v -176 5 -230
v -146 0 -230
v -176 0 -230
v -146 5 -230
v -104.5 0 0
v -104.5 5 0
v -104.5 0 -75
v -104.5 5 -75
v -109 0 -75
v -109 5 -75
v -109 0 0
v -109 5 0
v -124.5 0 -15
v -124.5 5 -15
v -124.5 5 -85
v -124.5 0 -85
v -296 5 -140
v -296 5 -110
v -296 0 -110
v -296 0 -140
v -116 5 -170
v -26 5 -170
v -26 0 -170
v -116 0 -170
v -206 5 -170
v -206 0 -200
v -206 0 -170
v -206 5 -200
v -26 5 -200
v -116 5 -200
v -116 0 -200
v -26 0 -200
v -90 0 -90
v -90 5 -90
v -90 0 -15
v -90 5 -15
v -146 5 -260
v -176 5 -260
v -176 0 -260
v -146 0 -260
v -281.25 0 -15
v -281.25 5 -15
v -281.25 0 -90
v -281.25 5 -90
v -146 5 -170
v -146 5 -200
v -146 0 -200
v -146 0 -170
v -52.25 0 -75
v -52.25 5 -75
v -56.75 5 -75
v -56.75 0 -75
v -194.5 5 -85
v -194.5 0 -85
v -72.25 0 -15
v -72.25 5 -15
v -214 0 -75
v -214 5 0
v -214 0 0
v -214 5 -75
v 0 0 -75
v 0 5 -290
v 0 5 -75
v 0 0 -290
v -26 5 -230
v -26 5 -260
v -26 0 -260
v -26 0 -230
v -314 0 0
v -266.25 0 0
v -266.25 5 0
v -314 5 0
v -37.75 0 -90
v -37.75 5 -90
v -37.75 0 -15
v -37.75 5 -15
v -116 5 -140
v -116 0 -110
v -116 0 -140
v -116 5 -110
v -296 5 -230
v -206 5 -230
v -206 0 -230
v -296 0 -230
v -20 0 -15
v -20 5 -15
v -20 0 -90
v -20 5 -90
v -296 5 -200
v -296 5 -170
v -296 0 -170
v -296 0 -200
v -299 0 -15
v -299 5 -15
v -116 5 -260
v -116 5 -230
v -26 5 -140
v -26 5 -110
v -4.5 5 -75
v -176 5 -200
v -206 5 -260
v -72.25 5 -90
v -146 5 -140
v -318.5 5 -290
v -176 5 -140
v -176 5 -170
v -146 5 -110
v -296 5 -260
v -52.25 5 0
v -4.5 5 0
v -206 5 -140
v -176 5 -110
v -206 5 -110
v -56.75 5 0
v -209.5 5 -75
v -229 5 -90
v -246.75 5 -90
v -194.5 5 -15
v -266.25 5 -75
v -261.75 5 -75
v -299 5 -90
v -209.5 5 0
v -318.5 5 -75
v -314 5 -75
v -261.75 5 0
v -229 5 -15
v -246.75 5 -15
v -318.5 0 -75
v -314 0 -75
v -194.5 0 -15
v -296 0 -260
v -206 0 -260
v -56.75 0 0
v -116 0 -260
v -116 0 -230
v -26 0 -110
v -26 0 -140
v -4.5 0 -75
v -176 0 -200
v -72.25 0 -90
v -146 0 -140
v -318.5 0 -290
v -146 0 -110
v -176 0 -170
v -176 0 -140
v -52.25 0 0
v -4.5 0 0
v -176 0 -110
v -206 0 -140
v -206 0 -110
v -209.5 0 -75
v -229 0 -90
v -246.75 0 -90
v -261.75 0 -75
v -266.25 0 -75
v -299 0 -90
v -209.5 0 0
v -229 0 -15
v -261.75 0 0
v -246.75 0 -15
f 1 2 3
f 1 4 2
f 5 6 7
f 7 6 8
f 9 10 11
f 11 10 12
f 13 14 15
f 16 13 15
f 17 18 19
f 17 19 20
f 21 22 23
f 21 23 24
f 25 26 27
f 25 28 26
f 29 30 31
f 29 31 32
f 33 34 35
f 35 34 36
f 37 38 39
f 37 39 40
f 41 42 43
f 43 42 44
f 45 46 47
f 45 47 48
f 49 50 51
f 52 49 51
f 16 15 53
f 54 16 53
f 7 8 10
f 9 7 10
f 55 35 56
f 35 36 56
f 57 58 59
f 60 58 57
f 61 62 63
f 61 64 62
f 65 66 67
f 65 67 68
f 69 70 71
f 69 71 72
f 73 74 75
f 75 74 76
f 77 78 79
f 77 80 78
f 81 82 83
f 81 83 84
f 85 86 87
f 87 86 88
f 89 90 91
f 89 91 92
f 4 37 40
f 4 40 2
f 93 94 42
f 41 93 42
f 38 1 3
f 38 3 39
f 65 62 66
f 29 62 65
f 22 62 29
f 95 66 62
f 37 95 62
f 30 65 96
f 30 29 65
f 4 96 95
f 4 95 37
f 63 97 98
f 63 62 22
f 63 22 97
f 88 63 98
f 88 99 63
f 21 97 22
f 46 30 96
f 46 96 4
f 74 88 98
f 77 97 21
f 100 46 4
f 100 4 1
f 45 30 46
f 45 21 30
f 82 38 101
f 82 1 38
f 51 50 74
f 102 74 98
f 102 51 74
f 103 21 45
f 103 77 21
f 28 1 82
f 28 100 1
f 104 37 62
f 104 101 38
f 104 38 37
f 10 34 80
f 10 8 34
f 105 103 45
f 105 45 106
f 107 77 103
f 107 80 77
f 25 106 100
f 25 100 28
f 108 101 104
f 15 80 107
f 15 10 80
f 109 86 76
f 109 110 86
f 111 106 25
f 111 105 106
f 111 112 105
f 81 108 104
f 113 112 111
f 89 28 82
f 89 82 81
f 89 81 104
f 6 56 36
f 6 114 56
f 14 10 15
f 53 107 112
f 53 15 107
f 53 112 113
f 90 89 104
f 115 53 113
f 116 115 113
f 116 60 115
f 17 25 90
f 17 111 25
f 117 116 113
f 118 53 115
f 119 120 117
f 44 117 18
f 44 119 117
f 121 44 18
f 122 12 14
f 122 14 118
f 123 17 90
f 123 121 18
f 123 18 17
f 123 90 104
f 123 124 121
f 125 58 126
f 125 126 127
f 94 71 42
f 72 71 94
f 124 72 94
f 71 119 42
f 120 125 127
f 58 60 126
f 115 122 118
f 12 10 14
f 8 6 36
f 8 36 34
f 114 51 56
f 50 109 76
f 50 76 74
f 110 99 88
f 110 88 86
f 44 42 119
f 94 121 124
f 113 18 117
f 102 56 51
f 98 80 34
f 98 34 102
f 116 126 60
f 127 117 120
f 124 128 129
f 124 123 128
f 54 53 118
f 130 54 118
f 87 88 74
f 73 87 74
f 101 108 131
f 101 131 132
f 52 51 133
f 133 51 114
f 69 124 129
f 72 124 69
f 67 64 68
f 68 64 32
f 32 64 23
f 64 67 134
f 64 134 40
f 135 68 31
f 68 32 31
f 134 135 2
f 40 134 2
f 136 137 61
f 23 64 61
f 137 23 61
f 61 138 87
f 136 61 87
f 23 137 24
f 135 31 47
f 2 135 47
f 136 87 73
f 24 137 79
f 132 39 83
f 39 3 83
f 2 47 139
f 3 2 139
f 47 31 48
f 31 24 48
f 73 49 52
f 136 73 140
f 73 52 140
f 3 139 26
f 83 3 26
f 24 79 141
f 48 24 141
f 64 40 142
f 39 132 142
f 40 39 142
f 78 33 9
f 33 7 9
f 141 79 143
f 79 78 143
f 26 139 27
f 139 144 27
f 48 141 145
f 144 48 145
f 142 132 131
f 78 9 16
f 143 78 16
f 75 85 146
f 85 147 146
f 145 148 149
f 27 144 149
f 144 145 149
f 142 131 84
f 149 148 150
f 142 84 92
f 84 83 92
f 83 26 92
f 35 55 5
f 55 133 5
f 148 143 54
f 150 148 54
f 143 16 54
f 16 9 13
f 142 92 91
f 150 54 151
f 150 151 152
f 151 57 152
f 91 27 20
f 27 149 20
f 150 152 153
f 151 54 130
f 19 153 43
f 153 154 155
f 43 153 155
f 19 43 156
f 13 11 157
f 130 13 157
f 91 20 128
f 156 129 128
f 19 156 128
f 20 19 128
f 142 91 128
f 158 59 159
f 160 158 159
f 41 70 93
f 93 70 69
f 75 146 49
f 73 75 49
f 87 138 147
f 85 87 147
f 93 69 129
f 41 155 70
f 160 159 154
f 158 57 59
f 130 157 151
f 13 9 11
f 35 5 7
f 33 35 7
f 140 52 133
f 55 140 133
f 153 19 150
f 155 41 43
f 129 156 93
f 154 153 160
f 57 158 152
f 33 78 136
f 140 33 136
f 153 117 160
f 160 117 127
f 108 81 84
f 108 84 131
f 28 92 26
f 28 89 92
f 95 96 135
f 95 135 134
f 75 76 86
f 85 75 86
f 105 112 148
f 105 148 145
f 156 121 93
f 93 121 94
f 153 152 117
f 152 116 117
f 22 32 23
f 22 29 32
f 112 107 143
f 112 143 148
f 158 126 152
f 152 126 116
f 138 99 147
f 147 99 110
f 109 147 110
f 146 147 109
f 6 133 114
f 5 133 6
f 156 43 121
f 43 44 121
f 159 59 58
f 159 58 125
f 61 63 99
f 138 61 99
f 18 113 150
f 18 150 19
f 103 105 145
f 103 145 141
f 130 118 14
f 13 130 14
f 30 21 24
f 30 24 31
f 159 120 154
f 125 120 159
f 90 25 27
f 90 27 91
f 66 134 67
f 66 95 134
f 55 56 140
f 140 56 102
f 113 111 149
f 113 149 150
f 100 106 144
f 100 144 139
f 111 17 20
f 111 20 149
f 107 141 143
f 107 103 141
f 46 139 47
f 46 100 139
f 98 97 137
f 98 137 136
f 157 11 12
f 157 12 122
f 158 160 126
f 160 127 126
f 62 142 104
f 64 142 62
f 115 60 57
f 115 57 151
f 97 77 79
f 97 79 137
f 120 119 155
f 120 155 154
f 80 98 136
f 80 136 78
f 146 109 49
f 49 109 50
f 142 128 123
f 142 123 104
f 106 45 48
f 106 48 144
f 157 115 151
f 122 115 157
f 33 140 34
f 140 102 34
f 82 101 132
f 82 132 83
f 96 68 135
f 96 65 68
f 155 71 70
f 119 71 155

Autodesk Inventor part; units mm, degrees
ref_plane "YZ Plane" through (0, 0, 0) normal (1, 0, 0) x (0, 1, 0)
ref_plane "XZ Plane" through (0, 0, 0) normal (0, 1, 0) x (-1, 0, 0)
ref_plane "XY Plane" through (0, 0, 0) normal (0, 0, 1) x (1, 0, 0)
sketch "Sketch1" plane through (0, 0, 0) normal (0, 1, 0) x (-1, 0, 0)
  line L0 (0, 0) -> (318.5, 0)
  line L1 (318.5, 0) -> (318.5, -290)
  line L2 (318.5, -290) -> (0, -290)
  line L3 (0, -290) -> (0, 0)
  dimension "d0" = 318.5
  dimension "d1" = 290
extrude "Extrusion1" add sketch "Sketch1" along normal blind 5
sketch "Sketch2" plane through (0, 5, 0) normal (0, 1, 0) x (1, 0, 0)
  line L0 (0, 290) -> (-318.5, 290) projected
  line L1 (-318.5, 290) -> (-318.5, 75)
  line L2 (-318.5, 290) -> (-318.5, 0) projected
  line L3 (-318.5, 0) -> (0, 0) projected
  line L4 (-318.5, 75) -> (-314, 75)
  line L5 (-314, 75) -> (-314, 0)
  line L6 (-314, 0) -> (-318.5, 0)
  line L7 (-318.5, 0) -> (-318.5, 75)
  line L8 (-314, 75) -> (-266.25, 75)
  line L9 (-266.25, 75) -> (-261.75, 75)
  line L10 (-261.75, 75) -> (-261.75, 0)
  line L11 (-261.75, 0) -> (-266.25, 0)
  line L12 (-266.25, 0) -> (-266.25, 75)
  line L13 (-261.75, 75) -> (-214, 75)
  line L14 (-214, 75) -> (-209.5, 75)
  line L15 (-209.5, 75) -> (-209.5, 0)
  line L16 (-209.5, 0) -> (-214, 0)
  line L17 (-214, 0) -> (-214, 75)
  line L18 (-209.5, 75) -> (-162.03, 75)
  line L19 (-159.25, 290) -> (-159.25, 0)
  line L20 (0, 75) -> (-4.5, 75)
  line L21 (-4.5, 75) -> (-4.5, 0)
  line L22 (-4.5, 0) -> (0, 0)
  line L23 (0, 0) -> (0, 75)
  line L24 (-4.5, 75) -> (-52.25, 75)
  line L25 (-52.25, 75) -> (-56.75, 75)
  line L26 (-56.75, 75) -> (-56.75, 0)
  line L27 (-56.75, 0) -> (-52.25, 0)
  line L28 (-52.25, 0) -> (-52.25, 75)
  line L29 (-56.75, 75) -> (-104.5, 75)
  line L30 (-104.5, 75) -> (-109, 75)
  line L31 (-109, 75) -> (-109, 0)
  line L32 (-109, 0) -> (-104.5, 0)
  line L33 (-104.5, 0) -> (-104.5, 75)
  point P0 (-214, 0)
  point P1 (-266.25, 0)
  dimension "d4" = 215
  dimension "d5" = 4.5
  dimension "d6" = 47.75
  dimension "d7" = 4.5
  dimension "d8" = 47.75
  dimension "d9" = 4.5
  dimension "d10" = 47.47
extrude "Extrusion2" cut sketch "Sketch2" against normal blind 5 contours L31 L30 L33 L3 | L4 L5 L3 L2 | L3 L17 L14 L15 | L9 L10 L3 L12 | L26 L25 L28 L3 | L21 L20 L23 L3
sketch "Sketch3" plane through (0, 5, 0) normal (0, 1, 0) x (1, 0, 0)
  line L0 (-318.5, 290) -> (-318.5, 75) projected
  line L1 (-318.5, 290) -> (-296, 290)
  line L2 (-296, 290) -> (-296, 260)
  line L3 (-296, 260) -> (-318.5, 260)
  line L4 (-318.5, 260) -> (-318.5, 290)
  line L5 (-296, 260) -> (-266, 260)
  line L6 (-266, 260) -> (-266, 230)
  line L7 (-266, 230) -> (-296, 230)
  line L8 (-296, 230) -> (-296, 260)
  line L9 (-266, 200) -> (-266, 170)
  line L10 (-266, 170) -> (-296, 170)
  line L11 (-296, 170) -> (-296, 200)
  line L12 (-296, 200) -> (-266, 200)
  line L13 (-266, 140) -> (-266, 110)
  line L14 (-266, 110) -> (-296, 110)
  line L15 (-296, 110) -> (-296, 140)
  line L16 (-296, 140) -> (-266, 140)
  line L17 (-206, 260) -> (-206, 230)
  line L18 (-206, 230) -> (-236, 230)
  line L19 (-236, 230) -> (-236, 260)
  line L20 (-236, 260) -> (-206, 260)
  line L21 (-206, 200) -> (-206, 170)
  line L22 (-206, 170) -> (-236, 170)
  line L23 (-236, 170) -> (-236, 200)
  line L24 (-236, 200) -> (-206, 200)
  line L25 (-206, 140) -> (-206, 110)
  line L26 (-206, 110) -> (-236, 110)
  line L27 (-236, 110) -> (-236, 140)
  line L28 (-236, 140) -> (-206, 140)
  line L29 (-146, 260) -> (-146, 230)
  line L30 (-146, 230) -> (-176, 230)
  line L31 (-176, 230) -> (-176, 260)
  line L32 (-176, 260) -> (-146, 260)
  line L33 (-146, 200) -> (-146, 170)
  line L34 (-146, 170) -> (-176, 170)
  line L35 (-176, 170) -> (-176, 200)
  line L36 (-176, 200) -> (-146, 200)
  line L37 (-146, 140) -> (-146, 110)
  line L38 (-146, 110) -> (-176, 110)
  line L39 (-176, 110) -> (-176, 140)
  line L40 (-176, 140) -> (-146, 140)
  line L41 (-86, 260) -> (-86, 230)
  line L42 (-86, 230) -> (-116, 230)
  line L43 (-116, 230) -> (-116, 260)
  line L44 (-116, 260) -> (-86, 260)
  line L45 (-86, 200) -> (-86, 170)
  line L46 (-86, 170) -> (-116, 170)
  line L47 (-116, 170) -> (-116, 200)
  line L48 (-116, 200) -> (-86, 200)
  line L49 (-86, 140) -> (-86, 110)
  line L50 (-86, 110) -> (-116, 110)
  line L51 (-116, 110) -> (-116, 140)
  line L52 (-116, 140) -> (-86, 140)
  line L53 (-26, 260) -> (-26, 230)
  line L54 (-26, 230) -> (-56, 230)
  line L55 (-56, 230) -> (-56, 260)
  line L56 (-56, 260) -> (-26, 260)
  line L57 (-26, 200) -> (-26, 170)
  line L58 (-26, 170) -> (-56, 170)
  line L59 (-56, 170) -> (-56, 200)
  line L60 (-56, 200) -> (-26, 200)
  line L61 (-26, 140) -> (-26, 110)
  line L62 (-26, 110) -> (-56, 110)
  line L63 (-56, 110) -> (-56, 140)
  line L64 (-56, 140) -> (-26, 140)
  line L65 (-266, 200) -> (-236, 200)
  line L66 (-236, 200) -> (-236, 170)
  line L67 (-236, 170) -> (-266, 170)
  line L68 (-266, 170) -> (-266, 200)
  line L69 (-86, 200) -> (-56, 200)
  line L70 (-56, 200) -> (-56, 170)
  line L71 (-56, 170) -> (-86, 170)
  line L72 (-86, 170) -> (-86, 200)
  line L73 (-86, 260) -> (-56, 260)
  line L74 (-56, 260) -> (-56, 230)
  line L75 (-56, 230) -> (-86, 230)
  line L76 (-86, 230) -> (-86, 260)
  line L77 (-266, 260) -> (-236, 260)
  line L78 (-236, 260) -> (-236, 230)
  line L79 (-236, 230) -> (-266, 230)
  line L80 (-266, 230) -> (-266, 260)
  line L81 (-266, 140) -> (-236, 140)
  line L82 (-236, 140) -> (-236, 110)
  line L83 (-236, 110) -> (-266, 110)
  line L84 (-266, 110) -> (-266, 140)
  line L85 (-86, 140) -> (-56, 140)
  line L86 (-56, 140) -> (-56, 110)
  line L87 (-56, 110) -> (-86, 110)
  line L88 (-86, 110) -> (-86, 140)
  line L89 (-209.5, 0) -> (-109, 0) projected
  line L90 (-209.5, 0) -> (-194.5, 0)
  line L91 (-194.5, 0) -> (-194.5, 15)
  line L92 (-194.5, 15) -> (-209.5, 15)
  line L93 (-209.5, 15) -> (-209.5, 0)
  line L94 (-194.5, 15) -> (-124.5, 15)
  line L95 (-124.5, 15) -> (-124.5, 85)
  line L96 (-124.5, 85) -> (-194.5, 85)
  line L97 (-194.5, 85) -> (-194.5, 15)
  line L98 (-314, 0) -> (-314, 75) projected
  line L99 (-314, 0) -> (-299, 0)
  line L100 (-299, 0) -> (-299, 15)
  line L101 (-299, 15) -> (-314, 15)
  line L102 (-314, 15) -> (-314, 0)
  line L103 (-266.25, 75) -> (-266.25, 0) projected
  line L104 (-266.25, 75) -> (-281.25, 75)
  line L105 (-281.25, 75) -> (-281.25, 90)
  line L106 (-281.25, 90) -> (-266.25, 90)
  line L107 (-266.25, 90) -> (-266.25, 75)
  line L108 (-281.25, 90) -> (-299, 90)
  line L109 (-299, 90) -> (-299, 15)
  line L110 (-299, 15) -> (-281.25, 15)
  line L111 (-281.25, 15) -> (-281.25, 90)
  line L112 (-229, 15) -> (-229, 90)
  line L113 (-246.75, 90) -> (-246.75, 15)
  line L114 (-246.75, 15) -> (-229, 15)
  line L115 (-229, 90) -> (-246.75, 90)
  line L116 (-176.75, 15) -> (-176.75, 90)
  line L117 (-194.5, 90) -> (-194.5, 15)
  line L118 (-194.5, 15) -> (-176.75, 15)
  line L119 (-176.75, 90) -> (-194.5, 90)
  line L120 (-124.5, 15) -> (-124.5, 90)
  line L121 (-142.25, 90) -> (-142.25, 15)
  line L122 (-142.25, 15) -> (-124.5, 15)
  line L123 (-124.5, 90) -> (-142.25, 90)
  line L124 (-72.25, 15) -> (-72.25, 90)
  line L125 (-90, 90) -> (-90, 15)
  line L126 (-90, 15) -> (-72.25, 15)
  line L127 (-72.25, 90) -> (-90, 90)
  line L128 (-20, 15) -> (-20, 90)
  line L129 (-37.75, 90) -> (-37.75, 15)
  line L130 (-37.75, 15) -> (-20, 15)
  line L131 (-20, 90) -> (-37.75, 90)
  point P0 (-209.5, 75)
  dimension "d25" = 22.5
  dimension "d26" = 30
  dimension "d27" = 30
  dimension "d28" = 30
  dimension "d31" = 60
  dimension "d34" = 60
  dimension "d37" = 15
  dimension "d38" = 15
  dimension "d39" = 70
  dimension "d40" = 70
  dimension "d41" = 15
  dimension "d42" = 15
  dimension "d43" = 15
  dimension "d44" = 15
  dimension "d47" = 52.25
extrude "Extrusion3" cut sketch "Sketch3" against normal blind 5 contours L5 L6 L7 L8 | L77 L19 L79 L6 | L20 L17 L18 L19 | L65 L23 L67 L9 | L9 L10 L11 L12 | L24 L21 L22 L23 | L81 L27 L83 L13 | L13 L14 L15 L16 | L28 L25 L26 L27 | L29 L30 L31 L32 | L33 L34 L35 L36 | L37 L38 L39 L40 | L73 L55 L75 L41 | L41 L42 L43 L44 | L56 L53 L54 L55 | L69 L59 L71 L45 | L45 L46 L47 L48 | L60 L57 L58 L59 | L85 L63 L87 L49 | L49 L50 L51 L52 | L64 L61 L62 L63 | L97 L96 L116 L94 | L116 L96 L121 L94 | L121 L96 L95 L94 | L109 L108 L105 L111 L110 | L114 L113 L115 L112 | L126 L125 L127 L124 | L130 L129 L131 L128
properties part number "backrest" material "Foam Core Board"
